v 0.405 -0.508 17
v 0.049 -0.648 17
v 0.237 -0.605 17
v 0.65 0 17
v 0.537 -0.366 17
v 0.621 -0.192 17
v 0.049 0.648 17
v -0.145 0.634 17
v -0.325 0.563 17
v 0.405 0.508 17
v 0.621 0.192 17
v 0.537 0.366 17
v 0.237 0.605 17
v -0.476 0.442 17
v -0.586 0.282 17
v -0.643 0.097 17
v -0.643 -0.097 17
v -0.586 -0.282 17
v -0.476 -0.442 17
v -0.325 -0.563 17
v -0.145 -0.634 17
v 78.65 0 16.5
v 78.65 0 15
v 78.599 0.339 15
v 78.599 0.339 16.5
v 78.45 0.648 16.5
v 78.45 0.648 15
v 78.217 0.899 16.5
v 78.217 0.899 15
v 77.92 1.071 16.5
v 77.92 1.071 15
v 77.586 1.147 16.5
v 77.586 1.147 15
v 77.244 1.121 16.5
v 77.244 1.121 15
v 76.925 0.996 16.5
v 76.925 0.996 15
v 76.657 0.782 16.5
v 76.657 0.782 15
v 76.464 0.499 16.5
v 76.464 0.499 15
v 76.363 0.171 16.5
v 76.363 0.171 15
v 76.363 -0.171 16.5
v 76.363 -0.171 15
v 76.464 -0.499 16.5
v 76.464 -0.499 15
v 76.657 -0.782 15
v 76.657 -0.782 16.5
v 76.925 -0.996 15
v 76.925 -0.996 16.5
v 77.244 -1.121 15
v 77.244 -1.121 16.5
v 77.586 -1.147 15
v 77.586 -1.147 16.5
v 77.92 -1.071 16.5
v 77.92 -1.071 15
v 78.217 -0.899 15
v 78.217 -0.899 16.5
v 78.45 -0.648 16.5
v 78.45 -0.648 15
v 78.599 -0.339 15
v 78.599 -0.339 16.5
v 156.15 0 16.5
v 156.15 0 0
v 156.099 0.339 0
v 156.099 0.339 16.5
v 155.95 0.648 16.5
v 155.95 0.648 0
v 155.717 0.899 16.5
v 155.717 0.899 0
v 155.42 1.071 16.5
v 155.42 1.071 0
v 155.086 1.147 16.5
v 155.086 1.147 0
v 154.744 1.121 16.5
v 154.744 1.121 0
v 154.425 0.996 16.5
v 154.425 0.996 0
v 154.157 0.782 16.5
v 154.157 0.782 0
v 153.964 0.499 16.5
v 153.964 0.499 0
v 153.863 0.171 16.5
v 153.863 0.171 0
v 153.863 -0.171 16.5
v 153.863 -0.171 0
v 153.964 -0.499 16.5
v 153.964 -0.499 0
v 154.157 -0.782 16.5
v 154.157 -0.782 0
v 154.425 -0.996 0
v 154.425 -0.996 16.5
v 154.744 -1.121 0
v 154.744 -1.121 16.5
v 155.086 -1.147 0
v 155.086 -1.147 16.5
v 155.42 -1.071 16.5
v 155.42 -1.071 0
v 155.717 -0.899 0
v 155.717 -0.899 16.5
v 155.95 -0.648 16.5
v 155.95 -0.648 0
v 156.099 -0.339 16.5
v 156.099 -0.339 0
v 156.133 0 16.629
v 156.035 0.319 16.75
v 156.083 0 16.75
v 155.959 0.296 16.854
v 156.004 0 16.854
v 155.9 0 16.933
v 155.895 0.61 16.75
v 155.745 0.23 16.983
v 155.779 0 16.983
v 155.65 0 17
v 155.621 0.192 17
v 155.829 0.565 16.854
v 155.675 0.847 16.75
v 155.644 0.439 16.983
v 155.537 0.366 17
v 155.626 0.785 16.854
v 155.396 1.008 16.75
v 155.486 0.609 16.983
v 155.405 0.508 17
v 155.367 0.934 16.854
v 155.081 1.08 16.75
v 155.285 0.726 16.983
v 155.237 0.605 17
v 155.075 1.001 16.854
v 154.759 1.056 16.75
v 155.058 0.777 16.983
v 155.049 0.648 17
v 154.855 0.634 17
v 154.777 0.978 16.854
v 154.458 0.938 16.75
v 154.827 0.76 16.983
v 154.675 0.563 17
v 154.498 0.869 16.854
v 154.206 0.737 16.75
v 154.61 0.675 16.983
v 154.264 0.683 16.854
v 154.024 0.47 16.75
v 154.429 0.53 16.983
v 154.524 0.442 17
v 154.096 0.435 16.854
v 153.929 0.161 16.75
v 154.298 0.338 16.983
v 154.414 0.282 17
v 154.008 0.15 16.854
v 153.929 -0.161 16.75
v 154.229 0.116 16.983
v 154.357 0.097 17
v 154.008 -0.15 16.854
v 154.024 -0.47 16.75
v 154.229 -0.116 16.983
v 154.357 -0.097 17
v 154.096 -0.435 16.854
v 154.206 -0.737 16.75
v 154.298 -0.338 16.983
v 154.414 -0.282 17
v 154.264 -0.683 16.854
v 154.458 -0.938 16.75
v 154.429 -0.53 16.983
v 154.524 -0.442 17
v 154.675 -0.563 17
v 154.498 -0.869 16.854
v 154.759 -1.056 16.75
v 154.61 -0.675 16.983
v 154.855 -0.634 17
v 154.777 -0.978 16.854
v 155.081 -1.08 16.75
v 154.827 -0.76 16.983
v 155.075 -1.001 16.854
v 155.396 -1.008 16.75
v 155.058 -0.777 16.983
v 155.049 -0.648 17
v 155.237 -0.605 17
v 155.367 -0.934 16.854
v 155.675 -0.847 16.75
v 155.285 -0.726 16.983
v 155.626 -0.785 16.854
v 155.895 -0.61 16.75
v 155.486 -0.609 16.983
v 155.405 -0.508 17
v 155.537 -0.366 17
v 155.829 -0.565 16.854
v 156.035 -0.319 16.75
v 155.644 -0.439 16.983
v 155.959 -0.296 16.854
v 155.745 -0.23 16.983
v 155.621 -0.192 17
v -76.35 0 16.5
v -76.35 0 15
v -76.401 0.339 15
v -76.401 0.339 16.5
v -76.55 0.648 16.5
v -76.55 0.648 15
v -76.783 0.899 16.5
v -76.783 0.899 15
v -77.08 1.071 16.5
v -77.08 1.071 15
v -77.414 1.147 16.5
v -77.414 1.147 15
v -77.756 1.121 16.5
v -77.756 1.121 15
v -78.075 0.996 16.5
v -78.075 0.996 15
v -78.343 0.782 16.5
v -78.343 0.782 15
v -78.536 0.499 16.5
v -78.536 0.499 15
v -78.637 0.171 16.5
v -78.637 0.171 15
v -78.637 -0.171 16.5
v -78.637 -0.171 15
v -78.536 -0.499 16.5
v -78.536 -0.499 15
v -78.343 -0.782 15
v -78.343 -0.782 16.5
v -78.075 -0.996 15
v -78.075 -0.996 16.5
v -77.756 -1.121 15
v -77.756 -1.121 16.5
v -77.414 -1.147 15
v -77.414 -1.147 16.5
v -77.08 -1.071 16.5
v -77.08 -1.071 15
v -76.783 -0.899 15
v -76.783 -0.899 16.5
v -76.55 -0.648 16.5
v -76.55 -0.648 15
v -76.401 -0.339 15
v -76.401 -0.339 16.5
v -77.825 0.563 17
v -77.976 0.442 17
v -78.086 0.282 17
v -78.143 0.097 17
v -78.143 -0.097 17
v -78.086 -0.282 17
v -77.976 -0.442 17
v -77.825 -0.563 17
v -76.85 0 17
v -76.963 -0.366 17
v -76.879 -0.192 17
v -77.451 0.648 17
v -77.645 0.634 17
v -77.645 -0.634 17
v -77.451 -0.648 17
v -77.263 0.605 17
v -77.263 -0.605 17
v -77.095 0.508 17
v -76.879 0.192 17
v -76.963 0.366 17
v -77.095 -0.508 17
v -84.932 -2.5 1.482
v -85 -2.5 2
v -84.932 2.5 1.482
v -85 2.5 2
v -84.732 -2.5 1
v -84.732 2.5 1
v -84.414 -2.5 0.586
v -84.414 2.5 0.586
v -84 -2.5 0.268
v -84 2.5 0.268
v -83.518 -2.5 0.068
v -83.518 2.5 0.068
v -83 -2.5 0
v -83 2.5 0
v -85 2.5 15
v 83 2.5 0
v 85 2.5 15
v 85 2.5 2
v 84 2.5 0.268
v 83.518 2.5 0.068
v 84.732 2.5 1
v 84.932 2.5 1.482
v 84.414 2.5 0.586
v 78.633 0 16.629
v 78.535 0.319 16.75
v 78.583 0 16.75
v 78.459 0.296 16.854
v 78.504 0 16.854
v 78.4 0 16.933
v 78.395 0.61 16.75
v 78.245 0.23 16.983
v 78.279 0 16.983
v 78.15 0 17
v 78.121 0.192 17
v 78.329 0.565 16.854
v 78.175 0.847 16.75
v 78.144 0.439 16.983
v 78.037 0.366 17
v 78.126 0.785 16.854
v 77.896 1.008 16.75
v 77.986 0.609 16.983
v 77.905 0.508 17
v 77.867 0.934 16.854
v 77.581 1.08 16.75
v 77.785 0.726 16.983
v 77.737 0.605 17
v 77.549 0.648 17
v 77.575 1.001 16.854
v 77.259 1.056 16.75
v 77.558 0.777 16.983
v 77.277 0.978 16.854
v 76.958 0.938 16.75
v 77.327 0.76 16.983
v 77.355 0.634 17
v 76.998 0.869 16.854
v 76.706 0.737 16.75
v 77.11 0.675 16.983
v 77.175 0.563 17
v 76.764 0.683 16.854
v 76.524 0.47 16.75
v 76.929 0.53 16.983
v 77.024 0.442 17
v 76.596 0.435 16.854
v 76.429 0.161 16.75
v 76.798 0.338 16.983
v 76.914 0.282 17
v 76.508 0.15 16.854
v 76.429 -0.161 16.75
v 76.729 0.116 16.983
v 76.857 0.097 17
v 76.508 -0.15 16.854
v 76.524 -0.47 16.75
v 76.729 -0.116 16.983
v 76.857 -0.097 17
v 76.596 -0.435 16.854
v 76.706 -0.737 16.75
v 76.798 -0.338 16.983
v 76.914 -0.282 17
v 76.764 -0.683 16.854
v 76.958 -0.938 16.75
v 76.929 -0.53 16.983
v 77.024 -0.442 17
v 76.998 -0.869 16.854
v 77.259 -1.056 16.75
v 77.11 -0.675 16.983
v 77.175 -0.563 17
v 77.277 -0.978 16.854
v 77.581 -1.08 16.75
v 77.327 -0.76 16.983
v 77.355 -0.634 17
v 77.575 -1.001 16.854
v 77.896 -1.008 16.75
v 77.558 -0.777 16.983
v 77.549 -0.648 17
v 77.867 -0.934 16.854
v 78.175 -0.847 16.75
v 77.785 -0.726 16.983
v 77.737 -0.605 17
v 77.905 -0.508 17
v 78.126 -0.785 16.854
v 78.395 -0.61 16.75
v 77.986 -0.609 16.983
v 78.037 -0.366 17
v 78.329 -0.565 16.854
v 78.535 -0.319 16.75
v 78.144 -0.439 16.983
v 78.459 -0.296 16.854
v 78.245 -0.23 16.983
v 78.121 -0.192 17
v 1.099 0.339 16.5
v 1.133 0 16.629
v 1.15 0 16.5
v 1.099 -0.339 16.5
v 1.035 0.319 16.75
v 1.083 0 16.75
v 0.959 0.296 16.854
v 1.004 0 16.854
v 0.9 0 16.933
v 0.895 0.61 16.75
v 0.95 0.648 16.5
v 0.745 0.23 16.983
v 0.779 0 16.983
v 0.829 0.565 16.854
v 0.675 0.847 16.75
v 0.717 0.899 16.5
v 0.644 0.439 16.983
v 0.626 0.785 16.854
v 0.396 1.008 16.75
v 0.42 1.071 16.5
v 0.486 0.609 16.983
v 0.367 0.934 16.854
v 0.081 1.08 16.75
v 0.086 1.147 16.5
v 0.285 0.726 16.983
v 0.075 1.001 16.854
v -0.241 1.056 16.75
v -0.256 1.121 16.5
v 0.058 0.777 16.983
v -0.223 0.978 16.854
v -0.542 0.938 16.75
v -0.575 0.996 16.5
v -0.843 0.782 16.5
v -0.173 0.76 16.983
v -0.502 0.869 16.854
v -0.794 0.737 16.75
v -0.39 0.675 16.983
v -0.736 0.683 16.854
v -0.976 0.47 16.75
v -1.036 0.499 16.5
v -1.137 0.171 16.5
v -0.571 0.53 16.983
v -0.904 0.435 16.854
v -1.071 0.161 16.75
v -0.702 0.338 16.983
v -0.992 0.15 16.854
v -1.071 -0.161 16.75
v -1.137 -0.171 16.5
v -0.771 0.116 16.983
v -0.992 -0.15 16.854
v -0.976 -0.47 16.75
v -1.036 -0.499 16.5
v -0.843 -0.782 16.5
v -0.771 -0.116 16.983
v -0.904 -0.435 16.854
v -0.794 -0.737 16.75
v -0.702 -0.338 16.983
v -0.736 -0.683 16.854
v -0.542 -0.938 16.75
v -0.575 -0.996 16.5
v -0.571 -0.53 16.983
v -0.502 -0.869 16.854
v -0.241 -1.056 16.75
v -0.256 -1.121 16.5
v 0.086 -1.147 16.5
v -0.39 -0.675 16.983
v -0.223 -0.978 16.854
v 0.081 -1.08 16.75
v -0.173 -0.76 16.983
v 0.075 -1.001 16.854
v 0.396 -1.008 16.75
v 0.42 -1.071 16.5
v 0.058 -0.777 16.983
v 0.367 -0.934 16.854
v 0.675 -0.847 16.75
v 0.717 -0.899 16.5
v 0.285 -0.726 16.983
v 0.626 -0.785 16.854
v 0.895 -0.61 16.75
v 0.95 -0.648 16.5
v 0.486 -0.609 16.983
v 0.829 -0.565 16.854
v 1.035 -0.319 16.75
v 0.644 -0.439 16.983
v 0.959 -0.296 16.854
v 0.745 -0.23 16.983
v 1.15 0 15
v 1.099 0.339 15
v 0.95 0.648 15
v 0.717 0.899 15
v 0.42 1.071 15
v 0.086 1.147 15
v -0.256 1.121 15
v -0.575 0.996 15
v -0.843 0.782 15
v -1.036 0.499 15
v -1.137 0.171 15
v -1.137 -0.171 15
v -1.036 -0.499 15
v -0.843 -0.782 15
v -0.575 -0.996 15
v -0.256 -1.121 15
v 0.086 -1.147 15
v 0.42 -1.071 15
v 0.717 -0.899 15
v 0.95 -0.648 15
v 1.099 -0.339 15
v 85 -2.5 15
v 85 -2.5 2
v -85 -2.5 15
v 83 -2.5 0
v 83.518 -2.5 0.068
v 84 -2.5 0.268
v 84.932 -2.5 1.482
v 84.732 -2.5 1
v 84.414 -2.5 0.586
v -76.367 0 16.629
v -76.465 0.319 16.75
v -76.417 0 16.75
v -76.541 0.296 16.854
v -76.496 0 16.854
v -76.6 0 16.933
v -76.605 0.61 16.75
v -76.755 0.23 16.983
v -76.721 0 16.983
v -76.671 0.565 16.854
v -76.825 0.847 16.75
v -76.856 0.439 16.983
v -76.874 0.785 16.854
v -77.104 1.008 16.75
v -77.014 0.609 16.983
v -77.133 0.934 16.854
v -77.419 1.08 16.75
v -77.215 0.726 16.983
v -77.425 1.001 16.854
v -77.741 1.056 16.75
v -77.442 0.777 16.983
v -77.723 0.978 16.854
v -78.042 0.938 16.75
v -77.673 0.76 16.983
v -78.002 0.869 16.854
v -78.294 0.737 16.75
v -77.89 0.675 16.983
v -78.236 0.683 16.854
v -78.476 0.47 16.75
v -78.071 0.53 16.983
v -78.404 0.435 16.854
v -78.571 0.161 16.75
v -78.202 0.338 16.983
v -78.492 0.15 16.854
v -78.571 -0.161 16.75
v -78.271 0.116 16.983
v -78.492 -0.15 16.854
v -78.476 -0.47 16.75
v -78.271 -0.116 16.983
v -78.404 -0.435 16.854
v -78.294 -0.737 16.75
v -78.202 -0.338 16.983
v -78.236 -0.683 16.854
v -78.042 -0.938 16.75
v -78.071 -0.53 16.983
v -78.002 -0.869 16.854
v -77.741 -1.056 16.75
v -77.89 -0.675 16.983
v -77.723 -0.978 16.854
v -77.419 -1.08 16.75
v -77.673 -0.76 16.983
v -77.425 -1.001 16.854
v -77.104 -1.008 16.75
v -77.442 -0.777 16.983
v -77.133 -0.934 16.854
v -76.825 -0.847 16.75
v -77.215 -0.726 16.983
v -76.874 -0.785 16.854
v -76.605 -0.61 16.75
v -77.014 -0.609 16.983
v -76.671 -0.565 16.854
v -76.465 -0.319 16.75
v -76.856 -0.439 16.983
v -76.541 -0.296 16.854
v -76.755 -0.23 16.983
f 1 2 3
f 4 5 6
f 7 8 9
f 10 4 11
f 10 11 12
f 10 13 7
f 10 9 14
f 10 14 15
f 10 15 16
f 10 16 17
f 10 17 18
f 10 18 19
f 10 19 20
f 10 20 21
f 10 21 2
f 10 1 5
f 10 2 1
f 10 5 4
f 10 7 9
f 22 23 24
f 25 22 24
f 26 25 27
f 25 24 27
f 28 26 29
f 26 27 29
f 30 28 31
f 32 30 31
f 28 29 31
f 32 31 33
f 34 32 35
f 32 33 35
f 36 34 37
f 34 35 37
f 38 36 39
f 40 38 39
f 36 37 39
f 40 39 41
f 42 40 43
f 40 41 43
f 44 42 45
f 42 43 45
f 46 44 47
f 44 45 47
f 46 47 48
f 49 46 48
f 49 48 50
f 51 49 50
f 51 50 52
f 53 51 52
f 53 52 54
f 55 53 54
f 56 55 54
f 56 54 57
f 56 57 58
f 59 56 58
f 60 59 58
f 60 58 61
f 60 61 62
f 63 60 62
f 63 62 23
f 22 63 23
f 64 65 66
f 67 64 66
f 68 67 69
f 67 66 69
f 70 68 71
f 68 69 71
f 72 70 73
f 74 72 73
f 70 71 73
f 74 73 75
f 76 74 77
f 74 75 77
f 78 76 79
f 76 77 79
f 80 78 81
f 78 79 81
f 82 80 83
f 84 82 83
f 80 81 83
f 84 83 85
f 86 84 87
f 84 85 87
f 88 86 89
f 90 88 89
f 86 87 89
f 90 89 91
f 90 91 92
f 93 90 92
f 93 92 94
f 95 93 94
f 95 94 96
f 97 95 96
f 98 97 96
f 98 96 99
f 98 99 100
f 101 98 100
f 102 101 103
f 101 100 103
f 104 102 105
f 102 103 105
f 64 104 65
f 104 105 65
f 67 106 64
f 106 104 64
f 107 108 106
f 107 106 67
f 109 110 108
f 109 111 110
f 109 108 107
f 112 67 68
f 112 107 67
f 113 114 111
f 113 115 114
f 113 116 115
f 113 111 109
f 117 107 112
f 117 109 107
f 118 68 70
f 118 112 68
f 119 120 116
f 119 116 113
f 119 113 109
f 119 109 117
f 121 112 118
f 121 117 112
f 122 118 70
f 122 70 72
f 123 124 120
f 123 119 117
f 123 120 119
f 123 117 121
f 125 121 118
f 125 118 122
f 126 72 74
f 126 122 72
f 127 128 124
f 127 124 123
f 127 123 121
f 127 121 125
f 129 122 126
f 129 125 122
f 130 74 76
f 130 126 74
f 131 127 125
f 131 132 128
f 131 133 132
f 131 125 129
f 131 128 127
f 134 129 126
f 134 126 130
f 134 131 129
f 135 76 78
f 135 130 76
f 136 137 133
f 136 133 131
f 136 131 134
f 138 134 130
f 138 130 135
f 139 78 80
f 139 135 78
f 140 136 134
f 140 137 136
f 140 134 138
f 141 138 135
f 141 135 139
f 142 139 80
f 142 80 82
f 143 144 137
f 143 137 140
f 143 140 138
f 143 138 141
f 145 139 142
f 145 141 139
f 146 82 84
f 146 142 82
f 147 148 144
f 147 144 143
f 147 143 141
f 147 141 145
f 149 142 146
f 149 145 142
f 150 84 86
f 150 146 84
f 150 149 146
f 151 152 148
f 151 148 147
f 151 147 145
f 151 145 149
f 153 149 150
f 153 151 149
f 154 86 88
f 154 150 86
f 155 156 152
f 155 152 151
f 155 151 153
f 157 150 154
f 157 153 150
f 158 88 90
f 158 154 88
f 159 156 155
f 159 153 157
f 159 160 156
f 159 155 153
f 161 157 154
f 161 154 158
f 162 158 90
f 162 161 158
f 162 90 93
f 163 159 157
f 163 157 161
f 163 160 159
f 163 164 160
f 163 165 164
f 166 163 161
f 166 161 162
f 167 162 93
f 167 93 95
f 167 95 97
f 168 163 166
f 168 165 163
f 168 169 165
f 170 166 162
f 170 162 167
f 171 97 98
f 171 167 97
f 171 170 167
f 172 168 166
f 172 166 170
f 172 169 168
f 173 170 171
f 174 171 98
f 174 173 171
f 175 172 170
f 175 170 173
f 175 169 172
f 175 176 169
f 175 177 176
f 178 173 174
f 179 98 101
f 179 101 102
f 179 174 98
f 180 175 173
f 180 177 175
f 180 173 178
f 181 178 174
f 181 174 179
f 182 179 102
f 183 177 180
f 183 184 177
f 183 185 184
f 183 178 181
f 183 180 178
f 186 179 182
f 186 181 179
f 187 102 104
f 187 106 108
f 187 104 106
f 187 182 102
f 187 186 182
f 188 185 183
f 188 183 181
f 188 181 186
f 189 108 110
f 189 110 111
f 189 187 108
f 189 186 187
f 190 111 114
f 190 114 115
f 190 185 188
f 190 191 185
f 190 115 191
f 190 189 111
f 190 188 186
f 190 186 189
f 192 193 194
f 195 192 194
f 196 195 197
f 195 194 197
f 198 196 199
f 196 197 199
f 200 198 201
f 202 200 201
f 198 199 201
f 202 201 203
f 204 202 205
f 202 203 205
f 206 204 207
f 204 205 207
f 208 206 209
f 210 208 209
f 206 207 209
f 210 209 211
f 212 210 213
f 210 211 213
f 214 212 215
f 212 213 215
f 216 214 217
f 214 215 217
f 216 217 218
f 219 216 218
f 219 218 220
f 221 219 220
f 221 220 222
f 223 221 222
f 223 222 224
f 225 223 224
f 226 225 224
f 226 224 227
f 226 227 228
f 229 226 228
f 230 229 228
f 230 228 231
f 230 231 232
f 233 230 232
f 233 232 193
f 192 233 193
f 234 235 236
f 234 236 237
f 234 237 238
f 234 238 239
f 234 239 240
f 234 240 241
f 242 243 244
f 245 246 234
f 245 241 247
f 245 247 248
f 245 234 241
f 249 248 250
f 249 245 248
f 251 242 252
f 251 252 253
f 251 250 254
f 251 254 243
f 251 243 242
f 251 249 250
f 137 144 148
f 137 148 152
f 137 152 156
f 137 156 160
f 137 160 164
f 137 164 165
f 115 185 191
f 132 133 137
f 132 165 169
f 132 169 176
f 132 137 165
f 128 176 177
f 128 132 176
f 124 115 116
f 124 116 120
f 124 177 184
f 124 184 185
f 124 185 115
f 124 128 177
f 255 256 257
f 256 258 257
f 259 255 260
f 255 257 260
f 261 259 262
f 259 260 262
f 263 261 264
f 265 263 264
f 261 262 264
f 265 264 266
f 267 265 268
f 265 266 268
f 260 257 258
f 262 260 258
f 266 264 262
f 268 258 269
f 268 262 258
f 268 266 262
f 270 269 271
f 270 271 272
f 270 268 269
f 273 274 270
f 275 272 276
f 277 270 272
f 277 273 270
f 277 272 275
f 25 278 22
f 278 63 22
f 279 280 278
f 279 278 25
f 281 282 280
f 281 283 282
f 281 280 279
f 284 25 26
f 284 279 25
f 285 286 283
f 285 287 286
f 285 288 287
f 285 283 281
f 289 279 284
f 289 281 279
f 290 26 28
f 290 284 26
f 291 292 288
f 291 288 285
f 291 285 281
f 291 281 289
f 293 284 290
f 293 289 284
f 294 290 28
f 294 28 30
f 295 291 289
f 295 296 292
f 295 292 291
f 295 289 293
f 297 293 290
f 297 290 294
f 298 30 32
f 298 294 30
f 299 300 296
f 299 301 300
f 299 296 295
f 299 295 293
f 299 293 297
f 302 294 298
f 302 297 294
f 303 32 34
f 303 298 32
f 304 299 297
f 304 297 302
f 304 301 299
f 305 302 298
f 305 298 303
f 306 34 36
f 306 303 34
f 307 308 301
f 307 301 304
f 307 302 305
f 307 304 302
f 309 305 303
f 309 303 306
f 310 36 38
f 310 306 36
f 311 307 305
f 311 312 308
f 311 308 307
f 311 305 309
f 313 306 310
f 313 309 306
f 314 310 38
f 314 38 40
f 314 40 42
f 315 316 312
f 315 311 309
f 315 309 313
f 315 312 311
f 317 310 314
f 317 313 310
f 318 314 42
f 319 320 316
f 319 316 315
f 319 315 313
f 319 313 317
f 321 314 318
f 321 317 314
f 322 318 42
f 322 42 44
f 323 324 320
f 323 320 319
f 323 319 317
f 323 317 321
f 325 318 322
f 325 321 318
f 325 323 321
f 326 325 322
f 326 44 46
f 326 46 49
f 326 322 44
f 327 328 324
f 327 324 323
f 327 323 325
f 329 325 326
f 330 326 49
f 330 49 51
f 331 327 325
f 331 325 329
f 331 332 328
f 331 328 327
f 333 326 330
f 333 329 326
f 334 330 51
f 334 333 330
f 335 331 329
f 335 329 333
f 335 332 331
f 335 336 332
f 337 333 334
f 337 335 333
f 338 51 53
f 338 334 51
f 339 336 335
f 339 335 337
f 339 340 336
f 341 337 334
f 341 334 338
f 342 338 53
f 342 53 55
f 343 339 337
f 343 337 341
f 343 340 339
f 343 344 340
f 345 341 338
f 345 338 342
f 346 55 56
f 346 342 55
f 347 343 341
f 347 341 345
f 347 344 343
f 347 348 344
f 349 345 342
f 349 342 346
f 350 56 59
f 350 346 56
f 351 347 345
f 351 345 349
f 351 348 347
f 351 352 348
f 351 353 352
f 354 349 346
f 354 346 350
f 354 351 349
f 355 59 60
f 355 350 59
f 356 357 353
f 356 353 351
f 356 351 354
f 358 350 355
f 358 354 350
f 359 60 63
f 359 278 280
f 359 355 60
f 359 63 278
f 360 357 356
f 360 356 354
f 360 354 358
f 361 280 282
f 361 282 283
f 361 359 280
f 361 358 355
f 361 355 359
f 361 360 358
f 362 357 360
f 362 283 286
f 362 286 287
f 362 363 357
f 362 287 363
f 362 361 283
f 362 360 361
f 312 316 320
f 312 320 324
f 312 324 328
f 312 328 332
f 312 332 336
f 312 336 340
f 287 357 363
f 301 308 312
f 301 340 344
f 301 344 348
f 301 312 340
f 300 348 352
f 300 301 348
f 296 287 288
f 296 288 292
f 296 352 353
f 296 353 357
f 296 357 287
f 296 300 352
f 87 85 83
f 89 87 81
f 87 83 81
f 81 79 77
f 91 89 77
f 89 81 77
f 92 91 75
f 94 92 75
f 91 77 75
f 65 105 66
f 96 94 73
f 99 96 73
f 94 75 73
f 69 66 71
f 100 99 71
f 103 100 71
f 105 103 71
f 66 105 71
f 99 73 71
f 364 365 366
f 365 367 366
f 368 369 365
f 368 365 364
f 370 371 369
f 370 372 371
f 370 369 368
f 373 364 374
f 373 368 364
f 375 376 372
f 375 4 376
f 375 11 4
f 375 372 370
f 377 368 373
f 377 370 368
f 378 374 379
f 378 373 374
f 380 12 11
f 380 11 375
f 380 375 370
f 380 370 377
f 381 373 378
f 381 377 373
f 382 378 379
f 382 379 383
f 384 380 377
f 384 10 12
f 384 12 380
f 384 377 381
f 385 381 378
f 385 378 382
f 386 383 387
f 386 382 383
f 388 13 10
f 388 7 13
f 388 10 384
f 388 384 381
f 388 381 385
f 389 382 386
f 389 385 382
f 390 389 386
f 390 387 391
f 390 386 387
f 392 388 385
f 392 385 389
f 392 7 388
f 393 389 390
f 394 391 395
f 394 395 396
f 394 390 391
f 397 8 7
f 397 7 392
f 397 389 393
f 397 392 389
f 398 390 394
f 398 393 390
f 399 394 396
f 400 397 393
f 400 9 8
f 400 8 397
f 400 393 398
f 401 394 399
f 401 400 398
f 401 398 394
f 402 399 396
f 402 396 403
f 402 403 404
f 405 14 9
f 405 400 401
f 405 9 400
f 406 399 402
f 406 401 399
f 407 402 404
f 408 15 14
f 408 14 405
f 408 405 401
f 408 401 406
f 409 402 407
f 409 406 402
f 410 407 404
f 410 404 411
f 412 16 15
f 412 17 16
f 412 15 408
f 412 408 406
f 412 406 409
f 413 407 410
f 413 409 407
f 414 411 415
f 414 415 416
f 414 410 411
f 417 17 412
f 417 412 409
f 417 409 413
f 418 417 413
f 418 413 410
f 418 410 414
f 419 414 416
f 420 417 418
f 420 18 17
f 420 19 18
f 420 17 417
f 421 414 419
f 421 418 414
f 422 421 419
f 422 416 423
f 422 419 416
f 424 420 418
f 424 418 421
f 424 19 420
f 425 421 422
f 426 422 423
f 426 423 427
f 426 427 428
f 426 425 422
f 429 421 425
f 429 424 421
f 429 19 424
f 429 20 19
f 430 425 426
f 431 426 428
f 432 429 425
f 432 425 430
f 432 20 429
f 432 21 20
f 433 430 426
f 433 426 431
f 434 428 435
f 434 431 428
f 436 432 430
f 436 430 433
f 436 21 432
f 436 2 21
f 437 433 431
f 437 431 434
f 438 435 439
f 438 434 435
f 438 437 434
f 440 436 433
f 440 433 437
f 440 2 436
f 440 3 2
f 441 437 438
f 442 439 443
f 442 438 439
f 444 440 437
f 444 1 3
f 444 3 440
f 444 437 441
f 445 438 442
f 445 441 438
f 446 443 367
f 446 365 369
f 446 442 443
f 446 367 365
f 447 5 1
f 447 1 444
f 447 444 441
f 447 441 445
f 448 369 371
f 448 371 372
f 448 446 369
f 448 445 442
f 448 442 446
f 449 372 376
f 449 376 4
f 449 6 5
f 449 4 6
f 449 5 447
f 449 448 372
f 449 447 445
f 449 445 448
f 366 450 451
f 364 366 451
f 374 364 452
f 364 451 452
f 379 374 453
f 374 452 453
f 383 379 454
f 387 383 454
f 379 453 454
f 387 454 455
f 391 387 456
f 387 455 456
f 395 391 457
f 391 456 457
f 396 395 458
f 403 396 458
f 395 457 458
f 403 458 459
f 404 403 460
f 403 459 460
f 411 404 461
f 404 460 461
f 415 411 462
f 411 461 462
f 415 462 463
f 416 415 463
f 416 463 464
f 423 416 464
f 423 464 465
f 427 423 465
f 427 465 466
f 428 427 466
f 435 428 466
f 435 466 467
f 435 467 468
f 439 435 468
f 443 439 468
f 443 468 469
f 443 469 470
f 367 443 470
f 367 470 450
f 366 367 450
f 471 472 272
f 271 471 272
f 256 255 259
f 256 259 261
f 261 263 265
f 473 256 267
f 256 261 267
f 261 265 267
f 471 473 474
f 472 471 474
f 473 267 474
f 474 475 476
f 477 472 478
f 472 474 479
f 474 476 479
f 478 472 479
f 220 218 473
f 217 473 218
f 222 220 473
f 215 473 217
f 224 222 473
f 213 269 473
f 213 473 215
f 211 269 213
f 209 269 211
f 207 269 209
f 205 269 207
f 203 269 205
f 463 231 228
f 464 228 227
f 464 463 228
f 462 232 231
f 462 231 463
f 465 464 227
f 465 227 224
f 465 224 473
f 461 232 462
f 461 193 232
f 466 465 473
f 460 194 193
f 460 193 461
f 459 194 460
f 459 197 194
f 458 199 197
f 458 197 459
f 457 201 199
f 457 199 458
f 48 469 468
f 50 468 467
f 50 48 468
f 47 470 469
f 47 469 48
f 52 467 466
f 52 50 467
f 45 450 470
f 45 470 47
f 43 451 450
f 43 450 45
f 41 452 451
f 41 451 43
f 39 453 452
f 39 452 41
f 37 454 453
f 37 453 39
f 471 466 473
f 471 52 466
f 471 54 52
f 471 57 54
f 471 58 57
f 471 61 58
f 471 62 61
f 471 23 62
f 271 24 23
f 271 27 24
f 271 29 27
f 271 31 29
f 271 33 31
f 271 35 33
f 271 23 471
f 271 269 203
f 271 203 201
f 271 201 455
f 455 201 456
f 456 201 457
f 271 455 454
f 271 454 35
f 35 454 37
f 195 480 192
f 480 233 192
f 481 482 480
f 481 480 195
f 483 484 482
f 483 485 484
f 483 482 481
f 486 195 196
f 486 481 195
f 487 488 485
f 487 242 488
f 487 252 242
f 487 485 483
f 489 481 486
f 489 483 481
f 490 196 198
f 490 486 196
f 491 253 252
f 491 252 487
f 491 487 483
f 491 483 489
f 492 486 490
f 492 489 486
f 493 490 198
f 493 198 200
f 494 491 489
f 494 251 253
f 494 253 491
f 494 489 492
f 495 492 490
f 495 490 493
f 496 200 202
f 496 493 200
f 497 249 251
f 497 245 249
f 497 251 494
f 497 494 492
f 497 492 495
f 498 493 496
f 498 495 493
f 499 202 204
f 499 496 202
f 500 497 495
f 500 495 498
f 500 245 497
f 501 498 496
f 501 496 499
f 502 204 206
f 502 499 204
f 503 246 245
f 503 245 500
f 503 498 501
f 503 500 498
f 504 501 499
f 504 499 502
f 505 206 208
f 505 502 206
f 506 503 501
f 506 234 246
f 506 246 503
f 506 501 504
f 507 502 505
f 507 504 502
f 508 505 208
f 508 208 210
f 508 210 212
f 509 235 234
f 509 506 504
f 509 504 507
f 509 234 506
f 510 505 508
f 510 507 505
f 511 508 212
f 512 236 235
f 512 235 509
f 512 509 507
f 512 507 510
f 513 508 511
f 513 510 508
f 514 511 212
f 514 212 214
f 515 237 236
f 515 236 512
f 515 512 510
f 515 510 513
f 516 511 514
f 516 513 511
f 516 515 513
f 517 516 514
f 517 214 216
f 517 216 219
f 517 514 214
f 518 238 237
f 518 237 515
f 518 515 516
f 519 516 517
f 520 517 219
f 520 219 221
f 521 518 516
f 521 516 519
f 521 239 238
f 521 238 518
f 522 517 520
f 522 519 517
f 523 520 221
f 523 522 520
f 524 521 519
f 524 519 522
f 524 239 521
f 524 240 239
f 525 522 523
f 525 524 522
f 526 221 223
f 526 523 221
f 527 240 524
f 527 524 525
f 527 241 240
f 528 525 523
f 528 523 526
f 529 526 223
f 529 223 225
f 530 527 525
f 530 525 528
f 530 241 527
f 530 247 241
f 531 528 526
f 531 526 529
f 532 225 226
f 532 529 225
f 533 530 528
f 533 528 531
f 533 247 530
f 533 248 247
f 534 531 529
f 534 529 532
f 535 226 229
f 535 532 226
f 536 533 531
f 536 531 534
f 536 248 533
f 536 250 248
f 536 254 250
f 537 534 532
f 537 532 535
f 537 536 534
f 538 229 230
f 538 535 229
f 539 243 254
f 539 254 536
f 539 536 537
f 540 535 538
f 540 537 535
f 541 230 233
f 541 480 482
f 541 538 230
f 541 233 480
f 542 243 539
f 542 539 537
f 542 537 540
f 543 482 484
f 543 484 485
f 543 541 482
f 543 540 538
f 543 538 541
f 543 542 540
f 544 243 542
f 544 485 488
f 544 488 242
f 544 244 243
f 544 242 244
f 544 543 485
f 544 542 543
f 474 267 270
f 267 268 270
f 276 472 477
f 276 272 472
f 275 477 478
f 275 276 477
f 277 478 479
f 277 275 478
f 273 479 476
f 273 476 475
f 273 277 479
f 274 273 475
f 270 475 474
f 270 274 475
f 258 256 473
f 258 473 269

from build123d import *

# Parameters (mm, degrees)
F0_W     = 170
F0_H     = 5
F0_R     = 1.15
F1_DEPTH = 15
F2_DEPTH = 17
F3_R     = 0.5
F4_R     = 2


with BuildPart() as f1:
    # F0 (on Top) → F1 (new body)
    with BuildSketch(Plane.XY):
        Rectangle(F0_W, F0_H)
        with Locations((-77.5, 0)):
            Circle(F0_R, mode=Mode.SUBTRACT)
        Circle(F0_R, mode=Mode.SUBTRACT)
        with Locations((77.5, 0)):
            Circle(F0_R, mode=Mode.SUBTRACT)
    extrude(amount=F1_DEPTH)

    # F0 (on Top) → F2 (join)
    with BuildSketch(Plane.XY):
        with Locations((-77.5, 0)):
            Circle(F0_R)
        Circle(F0_R)
        with Locations((77.5, 0)):
            Circle(F0_R)
        with Locations((155, 0)):
            Circle(F0_R)
    extrude(amount=F2_DEPTH)

    # F3
    f3_edges = [f1.edges().sort_by_distance(p)[0] for p in [
        (-78.65, 0, 17),
        (-1.15, 0, 17),
        (76.35, 0, 17),
        (153.85, 0, 17),
    ]]
    fillet(f3_edges, radius=F3_R)

    # F4
    f4_edges = [f1.edges().sort_by_distance(p)[0] for p in [
        (-85, 0, 0),
        (85, 0, 0),
    ]]
    fillet(f4_edges, radius=F4_R)


solid = f1.part
